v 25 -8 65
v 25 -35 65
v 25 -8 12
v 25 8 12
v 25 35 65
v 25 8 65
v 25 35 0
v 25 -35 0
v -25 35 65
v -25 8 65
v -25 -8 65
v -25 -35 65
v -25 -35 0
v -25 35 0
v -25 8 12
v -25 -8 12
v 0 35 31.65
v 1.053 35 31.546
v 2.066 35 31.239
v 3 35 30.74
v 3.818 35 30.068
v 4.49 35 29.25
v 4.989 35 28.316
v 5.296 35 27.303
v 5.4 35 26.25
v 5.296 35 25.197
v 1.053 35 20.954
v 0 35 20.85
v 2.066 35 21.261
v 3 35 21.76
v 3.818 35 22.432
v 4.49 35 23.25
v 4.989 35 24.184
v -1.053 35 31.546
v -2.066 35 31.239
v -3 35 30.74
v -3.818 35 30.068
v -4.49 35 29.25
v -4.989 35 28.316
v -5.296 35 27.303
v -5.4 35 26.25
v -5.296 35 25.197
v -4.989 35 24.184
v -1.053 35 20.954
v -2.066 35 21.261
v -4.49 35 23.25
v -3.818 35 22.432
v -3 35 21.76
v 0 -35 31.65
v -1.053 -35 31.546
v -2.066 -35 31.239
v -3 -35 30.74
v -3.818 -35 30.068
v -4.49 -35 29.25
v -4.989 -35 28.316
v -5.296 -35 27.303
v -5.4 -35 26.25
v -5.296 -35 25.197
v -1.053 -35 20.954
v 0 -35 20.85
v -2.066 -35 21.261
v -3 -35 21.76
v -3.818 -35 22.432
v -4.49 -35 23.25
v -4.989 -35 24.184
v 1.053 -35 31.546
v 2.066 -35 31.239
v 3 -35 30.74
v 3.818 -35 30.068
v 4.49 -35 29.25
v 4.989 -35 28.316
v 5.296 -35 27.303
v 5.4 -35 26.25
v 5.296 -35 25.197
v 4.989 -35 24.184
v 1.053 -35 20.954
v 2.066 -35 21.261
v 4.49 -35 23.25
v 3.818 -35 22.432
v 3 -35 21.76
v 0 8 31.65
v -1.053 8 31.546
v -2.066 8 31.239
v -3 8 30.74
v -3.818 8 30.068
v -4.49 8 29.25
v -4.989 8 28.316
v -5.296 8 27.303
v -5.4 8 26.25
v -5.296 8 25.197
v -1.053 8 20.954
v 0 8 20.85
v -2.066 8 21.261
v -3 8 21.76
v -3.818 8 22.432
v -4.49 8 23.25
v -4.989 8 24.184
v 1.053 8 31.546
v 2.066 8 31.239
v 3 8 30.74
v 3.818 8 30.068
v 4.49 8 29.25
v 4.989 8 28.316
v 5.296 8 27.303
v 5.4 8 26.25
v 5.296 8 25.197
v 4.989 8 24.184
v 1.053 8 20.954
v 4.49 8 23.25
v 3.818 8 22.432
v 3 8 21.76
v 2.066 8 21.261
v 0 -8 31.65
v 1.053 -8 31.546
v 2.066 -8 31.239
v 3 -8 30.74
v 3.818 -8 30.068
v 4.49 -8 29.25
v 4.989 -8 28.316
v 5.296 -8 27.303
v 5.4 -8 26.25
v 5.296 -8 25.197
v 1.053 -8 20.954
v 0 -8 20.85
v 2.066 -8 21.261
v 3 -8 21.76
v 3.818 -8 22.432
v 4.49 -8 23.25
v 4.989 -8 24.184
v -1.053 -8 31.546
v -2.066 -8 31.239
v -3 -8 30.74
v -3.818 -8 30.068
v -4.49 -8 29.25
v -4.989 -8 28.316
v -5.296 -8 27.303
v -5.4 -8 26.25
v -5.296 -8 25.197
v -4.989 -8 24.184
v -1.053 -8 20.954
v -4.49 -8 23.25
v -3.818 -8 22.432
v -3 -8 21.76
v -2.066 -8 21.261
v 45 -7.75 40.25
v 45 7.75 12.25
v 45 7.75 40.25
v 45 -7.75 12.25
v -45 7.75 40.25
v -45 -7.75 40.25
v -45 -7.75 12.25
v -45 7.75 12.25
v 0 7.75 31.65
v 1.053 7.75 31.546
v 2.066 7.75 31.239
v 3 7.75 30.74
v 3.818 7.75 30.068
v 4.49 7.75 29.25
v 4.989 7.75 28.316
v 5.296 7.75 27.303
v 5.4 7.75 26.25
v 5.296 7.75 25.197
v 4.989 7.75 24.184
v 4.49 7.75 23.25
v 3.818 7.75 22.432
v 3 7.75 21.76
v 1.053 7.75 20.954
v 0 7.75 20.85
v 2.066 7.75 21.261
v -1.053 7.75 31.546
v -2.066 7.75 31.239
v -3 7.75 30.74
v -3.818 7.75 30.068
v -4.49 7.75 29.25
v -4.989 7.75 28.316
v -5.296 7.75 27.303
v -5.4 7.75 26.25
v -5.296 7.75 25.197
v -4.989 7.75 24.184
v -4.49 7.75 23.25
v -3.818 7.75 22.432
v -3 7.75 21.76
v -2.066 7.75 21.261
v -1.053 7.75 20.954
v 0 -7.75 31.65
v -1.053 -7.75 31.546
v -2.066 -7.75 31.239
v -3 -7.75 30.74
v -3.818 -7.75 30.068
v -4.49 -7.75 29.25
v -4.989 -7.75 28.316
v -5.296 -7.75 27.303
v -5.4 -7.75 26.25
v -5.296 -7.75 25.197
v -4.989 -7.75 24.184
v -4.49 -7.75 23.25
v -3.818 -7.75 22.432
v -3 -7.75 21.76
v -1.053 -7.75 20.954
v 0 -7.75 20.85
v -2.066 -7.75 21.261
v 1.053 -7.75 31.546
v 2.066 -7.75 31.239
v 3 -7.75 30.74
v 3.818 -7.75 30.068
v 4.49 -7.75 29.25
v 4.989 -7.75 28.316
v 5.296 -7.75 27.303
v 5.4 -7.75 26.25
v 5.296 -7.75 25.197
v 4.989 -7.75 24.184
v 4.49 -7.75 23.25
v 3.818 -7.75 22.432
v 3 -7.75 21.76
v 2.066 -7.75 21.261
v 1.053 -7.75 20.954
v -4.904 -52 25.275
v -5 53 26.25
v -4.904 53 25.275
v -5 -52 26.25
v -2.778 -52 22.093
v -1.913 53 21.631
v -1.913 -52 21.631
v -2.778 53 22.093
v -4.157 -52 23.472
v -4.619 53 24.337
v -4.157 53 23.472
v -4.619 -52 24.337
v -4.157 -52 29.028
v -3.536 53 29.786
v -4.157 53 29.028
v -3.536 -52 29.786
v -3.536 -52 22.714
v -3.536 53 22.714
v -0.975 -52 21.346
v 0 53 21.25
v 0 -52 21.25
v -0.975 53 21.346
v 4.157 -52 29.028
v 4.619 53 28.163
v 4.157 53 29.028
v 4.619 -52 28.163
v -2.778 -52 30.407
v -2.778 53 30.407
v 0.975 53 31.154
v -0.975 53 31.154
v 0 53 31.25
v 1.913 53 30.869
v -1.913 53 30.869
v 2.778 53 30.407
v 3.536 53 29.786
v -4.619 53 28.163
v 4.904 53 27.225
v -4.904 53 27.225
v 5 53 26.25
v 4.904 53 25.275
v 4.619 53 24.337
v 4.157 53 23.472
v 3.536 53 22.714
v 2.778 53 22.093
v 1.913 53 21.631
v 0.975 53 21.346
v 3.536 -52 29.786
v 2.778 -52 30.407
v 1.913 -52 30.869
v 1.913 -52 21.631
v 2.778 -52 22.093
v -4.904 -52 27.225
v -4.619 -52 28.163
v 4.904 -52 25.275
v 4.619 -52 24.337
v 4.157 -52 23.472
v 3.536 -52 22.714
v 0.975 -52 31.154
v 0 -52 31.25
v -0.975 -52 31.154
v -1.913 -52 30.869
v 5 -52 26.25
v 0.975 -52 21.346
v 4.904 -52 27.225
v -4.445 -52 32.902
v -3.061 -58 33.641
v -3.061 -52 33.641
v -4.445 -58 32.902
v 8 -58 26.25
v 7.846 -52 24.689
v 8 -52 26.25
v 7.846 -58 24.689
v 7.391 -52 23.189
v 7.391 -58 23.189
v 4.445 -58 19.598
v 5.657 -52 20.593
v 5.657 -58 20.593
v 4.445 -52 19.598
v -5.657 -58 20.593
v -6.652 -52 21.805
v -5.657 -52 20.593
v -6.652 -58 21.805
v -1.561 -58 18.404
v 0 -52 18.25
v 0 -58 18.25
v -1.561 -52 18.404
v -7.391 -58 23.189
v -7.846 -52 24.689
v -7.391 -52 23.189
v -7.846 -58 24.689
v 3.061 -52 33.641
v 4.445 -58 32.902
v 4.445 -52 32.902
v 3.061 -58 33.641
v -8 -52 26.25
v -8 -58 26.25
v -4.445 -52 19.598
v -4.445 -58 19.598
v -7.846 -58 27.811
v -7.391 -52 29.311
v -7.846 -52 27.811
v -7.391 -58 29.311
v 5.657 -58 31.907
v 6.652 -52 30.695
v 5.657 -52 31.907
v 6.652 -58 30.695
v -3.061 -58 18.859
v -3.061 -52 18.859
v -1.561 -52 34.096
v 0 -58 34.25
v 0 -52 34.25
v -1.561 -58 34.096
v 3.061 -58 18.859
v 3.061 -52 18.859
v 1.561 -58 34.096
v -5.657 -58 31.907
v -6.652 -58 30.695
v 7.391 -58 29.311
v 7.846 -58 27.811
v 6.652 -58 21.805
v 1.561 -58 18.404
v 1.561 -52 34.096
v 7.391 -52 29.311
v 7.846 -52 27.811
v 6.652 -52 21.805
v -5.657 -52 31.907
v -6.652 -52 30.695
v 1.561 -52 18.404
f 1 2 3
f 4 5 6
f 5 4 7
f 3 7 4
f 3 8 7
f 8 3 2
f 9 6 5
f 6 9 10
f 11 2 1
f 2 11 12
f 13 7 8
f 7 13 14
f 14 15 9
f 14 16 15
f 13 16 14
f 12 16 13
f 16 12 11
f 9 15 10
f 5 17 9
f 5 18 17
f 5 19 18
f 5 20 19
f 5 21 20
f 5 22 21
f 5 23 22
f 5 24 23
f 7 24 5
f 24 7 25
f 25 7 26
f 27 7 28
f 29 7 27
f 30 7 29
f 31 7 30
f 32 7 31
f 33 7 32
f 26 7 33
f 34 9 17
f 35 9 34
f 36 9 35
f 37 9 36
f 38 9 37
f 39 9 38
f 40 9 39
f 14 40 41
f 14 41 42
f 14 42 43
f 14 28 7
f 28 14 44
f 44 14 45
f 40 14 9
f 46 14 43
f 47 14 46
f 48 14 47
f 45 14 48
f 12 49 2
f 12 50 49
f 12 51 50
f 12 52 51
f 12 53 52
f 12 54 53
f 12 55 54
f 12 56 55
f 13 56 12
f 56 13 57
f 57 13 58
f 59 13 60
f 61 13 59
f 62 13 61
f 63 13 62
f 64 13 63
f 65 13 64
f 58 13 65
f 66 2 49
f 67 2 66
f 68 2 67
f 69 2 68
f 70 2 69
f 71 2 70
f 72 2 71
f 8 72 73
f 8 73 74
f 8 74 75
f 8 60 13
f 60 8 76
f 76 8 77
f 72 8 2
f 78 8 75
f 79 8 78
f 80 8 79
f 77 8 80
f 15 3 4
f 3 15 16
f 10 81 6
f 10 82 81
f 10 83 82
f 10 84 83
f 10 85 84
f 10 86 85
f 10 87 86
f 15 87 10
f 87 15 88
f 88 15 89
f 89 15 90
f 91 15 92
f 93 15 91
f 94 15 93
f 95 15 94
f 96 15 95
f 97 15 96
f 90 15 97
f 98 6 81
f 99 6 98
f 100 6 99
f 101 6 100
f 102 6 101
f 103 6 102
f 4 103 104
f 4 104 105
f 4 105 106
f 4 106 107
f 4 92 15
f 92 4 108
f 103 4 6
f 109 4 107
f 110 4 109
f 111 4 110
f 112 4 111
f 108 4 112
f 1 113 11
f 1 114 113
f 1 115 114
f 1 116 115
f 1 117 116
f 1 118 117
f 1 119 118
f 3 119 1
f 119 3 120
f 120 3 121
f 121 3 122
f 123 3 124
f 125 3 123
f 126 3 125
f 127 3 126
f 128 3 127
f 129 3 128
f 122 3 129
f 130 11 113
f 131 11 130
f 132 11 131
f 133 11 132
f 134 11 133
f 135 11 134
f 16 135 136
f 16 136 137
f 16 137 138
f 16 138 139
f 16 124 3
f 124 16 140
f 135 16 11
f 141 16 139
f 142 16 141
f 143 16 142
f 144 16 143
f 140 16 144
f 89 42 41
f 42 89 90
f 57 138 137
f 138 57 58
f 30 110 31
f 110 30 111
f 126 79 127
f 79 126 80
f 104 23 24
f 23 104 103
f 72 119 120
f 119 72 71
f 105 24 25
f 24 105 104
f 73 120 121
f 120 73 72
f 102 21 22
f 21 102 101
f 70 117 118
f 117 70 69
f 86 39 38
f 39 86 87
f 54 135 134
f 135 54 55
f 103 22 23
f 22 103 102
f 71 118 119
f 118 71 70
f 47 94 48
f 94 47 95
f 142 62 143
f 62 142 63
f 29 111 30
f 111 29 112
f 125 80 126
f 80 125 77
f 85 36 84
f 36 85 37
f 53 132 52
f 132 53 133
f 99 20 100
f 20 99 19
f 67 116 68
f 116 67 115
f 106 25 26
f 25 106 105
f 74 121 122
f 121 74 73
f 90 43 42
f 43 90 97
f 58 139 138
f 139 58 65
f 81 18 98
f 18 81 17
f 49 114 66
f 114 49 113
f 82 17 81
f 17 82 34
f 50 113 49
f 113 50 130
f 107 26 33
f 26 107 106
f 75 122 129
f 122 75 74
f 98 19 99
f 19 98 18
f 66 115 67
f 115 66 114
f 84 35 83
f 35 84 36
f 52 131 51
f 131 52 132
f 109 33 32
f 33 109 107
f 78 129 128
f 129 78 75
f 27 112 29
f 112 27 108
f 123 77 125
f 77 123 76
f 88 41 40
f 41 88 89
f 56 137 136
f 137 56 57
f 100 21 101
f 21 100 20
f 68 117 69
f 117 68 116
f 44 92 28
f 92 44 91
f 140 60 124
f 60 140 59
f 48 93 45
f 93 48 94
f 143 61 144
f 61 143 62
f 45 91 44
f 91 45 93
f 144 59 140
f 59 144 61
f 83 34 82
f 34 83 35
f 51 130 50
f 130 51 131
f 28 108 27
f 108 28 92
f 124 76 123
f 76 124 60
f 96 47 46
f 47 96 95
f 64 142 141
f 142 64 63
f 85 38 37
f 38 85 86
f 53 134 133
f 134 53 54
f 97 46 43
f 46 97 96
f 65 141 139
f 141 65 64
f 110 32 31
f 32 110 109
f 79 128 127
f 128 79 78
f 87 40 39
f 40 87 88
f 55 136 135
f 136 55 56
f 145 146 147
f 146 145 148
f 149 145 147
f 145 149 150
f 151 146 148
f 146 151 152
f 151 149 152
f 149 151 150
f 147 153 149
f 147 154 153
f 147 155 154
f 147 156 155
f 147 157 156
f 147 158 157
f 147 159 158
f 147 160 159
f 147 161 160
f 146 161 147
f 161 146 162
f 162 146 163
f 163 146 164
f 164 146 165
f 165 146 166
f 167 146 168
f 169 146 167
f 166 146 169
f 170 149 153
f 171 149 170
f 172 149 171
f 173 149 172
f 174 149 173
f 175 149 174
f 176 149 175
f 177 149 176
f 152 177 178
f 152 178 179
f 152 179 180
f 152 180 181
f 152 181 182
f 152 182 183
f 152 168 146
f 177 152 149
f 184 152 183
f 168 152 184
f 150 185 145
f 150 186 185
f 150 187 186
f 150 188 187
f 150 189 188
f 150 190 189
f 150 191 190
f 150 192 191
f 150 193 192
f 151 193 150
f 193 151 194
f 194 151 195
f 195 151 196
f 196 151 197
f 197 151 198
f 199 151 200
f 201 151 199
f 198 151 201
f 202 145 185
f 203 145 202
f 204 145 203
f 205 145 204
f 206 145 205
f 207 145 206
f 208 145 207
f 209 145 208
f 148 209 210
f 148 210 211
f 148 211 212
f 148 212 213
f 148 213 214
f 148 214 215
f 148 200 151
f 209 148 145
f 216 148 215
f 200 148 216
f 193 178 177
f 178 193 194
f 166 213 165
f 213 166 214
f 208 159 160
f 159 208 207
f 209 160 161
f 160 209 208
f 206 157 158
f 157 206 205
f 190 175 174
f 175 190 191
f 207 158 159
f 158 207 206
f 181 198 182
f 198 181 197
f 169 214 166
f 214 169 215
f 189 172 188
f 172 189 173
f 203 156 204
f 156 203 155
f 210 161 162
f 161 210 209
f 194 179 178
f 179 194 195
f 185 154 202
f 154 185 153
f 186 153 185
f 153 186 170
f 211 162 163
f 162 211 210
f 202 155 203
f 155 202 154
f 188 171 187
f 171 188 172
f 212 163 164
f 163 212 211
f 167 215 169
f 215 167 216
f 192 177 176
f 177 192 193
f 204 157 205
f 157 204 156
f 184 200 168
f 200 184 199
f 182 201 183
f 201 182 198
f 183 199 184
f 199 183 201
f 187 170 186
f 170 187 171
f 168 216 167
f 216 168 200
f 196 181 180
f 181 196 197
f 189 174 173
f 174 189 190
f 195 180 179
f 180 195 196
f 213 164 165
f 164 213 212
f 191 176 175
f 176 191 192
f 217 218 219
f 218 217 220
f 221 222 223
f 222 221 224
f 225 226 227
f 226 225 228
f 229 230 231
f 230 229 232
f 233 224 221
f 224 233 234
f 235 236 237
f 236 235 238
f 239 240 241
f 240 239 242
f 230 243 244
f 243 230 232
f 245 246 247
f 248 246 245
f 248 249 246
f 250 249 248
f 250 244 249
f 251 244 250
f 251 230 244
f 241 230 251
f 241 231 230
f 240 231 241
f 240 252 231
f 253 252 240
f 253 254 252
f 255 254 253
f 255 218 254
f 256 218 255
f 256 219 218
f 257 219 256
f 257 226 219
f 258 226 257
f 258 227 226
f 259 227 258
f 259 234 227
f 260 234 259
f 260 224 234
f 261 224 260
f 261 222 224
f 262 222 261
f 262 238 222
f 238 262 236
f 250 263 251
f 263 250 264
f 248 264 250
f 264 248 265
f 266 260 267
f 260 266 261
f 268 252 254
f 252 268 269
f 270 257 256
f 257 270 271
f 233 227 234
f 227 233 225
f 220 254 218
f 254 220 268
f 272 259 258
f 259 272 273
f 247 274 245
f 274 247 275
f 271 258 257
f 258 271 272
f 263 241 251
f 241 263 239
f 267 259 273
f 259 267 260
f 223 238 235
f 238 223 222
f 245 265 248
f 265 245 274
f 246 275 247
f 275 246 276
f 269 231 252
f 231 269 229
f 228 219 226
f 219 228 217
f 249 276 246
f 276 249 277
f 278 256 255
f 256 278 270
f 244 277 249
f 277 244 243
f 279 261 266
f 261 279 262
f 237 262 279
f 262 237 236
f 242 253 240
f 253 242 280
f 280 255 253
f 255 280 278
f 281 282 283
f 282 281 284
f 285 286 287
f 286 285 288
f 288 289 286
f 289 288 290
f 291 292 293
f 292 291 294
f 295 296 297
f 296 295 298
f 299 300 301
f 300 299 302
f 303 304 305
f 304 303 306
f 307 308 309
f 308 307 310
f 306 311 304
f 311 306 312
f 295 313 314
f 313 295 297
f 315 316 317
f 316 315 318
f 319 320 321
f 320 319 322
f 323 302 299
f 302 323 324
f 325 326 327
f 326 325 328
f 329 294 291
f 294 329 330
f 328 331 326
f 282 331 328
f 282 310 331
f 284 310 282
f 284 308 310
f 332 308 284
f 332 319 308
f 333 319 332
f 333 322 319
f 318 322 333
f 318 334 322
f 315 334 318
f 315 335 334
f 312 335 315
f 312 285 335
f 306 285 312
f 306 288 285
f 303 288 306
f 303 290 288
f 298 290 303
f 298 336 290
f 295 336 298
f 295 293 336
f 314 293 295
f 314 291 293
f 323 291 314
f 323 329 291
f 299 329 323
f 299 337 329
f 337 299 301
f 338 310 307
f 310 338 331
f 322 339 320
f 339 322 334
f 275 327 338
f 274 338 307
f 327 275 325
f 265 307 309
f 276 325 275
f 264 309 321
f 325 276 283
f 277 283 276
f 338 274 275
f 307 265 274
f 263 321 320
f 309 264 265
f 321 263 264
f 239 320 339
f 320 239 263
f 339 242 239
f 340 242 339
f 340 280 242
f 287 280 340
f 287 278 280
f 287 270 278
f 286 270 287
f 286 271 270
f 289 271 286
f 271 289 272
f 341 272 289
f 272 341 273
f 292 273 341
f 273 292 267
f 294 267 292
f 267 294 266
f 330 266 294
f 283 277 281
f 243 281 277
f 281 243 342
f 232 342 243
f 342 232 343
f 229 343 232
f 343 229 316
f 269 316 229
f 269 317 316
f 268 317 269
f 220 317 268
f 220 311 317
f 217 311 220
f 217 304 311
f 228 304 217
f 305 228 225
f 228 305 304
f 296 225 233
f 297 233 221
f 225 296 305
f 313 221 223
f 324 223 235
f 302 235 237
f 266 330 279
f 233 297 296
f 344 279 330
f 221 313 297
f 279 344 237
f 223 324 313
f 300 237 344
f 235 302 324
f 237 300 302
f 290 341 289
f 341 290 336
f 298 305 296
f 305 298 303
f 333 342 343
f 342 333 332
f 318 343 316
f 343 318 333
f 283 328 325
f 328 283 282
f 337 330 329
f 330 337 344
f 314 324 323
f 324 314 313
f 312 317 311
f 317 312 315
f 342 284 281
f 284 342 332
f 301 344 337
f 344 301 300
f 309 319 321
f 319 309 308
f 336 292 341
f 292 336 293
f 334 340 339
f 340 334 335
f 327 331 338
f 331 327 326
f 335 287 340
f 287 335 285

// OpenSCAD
$fn = 32;

// ------------------------------------------------------------------------
// Clevis joint: 50 mm clevis, pin d10
// Every part is its own module, assembly() places them once.
// ------------------------------------------------------------------------

// --- part 1 ---
module clevis() {
  difference() {
    translate([-25, -35, 0]) cube([50, 70, 65]);
    translate([-26, -8, 12]) cube([52, 16, 54]);
    translate([0, 0, 26.25]) rotate([90, 0, 0]) cylinder(h = 72, d = 10.8, center = true);
  }
}

// --- part 2 ---
module eye() {
  difference() {
    translate([-45, -7.75, 0]) cube([90, 15.5, 28]);
    translate([0, 0, 14]) rotate([90, 0, 0]) cylinder(h = 17.5, d = 10.8, center = true);
  }
}

// --- part 3 ---
module pin() {
  rotate([0, 90, 0]) cylinder(h = 106, d = 10, center = true);
  translate([-58, 0, 0]) rotate([0, 90, 0]) cylinder(h = 6, d = 16);
}

// --- assembly ---
module assembly() {
  translate([0, 0, 0]) rotate([0, 0, 0]) clevis();
  translate([0, 0, 12.25]) rotate([0, 0, 0]) eye();
  translate([0, 0, 26.25]) rotate([0, 0, 90]) pin();
}

assembly();
